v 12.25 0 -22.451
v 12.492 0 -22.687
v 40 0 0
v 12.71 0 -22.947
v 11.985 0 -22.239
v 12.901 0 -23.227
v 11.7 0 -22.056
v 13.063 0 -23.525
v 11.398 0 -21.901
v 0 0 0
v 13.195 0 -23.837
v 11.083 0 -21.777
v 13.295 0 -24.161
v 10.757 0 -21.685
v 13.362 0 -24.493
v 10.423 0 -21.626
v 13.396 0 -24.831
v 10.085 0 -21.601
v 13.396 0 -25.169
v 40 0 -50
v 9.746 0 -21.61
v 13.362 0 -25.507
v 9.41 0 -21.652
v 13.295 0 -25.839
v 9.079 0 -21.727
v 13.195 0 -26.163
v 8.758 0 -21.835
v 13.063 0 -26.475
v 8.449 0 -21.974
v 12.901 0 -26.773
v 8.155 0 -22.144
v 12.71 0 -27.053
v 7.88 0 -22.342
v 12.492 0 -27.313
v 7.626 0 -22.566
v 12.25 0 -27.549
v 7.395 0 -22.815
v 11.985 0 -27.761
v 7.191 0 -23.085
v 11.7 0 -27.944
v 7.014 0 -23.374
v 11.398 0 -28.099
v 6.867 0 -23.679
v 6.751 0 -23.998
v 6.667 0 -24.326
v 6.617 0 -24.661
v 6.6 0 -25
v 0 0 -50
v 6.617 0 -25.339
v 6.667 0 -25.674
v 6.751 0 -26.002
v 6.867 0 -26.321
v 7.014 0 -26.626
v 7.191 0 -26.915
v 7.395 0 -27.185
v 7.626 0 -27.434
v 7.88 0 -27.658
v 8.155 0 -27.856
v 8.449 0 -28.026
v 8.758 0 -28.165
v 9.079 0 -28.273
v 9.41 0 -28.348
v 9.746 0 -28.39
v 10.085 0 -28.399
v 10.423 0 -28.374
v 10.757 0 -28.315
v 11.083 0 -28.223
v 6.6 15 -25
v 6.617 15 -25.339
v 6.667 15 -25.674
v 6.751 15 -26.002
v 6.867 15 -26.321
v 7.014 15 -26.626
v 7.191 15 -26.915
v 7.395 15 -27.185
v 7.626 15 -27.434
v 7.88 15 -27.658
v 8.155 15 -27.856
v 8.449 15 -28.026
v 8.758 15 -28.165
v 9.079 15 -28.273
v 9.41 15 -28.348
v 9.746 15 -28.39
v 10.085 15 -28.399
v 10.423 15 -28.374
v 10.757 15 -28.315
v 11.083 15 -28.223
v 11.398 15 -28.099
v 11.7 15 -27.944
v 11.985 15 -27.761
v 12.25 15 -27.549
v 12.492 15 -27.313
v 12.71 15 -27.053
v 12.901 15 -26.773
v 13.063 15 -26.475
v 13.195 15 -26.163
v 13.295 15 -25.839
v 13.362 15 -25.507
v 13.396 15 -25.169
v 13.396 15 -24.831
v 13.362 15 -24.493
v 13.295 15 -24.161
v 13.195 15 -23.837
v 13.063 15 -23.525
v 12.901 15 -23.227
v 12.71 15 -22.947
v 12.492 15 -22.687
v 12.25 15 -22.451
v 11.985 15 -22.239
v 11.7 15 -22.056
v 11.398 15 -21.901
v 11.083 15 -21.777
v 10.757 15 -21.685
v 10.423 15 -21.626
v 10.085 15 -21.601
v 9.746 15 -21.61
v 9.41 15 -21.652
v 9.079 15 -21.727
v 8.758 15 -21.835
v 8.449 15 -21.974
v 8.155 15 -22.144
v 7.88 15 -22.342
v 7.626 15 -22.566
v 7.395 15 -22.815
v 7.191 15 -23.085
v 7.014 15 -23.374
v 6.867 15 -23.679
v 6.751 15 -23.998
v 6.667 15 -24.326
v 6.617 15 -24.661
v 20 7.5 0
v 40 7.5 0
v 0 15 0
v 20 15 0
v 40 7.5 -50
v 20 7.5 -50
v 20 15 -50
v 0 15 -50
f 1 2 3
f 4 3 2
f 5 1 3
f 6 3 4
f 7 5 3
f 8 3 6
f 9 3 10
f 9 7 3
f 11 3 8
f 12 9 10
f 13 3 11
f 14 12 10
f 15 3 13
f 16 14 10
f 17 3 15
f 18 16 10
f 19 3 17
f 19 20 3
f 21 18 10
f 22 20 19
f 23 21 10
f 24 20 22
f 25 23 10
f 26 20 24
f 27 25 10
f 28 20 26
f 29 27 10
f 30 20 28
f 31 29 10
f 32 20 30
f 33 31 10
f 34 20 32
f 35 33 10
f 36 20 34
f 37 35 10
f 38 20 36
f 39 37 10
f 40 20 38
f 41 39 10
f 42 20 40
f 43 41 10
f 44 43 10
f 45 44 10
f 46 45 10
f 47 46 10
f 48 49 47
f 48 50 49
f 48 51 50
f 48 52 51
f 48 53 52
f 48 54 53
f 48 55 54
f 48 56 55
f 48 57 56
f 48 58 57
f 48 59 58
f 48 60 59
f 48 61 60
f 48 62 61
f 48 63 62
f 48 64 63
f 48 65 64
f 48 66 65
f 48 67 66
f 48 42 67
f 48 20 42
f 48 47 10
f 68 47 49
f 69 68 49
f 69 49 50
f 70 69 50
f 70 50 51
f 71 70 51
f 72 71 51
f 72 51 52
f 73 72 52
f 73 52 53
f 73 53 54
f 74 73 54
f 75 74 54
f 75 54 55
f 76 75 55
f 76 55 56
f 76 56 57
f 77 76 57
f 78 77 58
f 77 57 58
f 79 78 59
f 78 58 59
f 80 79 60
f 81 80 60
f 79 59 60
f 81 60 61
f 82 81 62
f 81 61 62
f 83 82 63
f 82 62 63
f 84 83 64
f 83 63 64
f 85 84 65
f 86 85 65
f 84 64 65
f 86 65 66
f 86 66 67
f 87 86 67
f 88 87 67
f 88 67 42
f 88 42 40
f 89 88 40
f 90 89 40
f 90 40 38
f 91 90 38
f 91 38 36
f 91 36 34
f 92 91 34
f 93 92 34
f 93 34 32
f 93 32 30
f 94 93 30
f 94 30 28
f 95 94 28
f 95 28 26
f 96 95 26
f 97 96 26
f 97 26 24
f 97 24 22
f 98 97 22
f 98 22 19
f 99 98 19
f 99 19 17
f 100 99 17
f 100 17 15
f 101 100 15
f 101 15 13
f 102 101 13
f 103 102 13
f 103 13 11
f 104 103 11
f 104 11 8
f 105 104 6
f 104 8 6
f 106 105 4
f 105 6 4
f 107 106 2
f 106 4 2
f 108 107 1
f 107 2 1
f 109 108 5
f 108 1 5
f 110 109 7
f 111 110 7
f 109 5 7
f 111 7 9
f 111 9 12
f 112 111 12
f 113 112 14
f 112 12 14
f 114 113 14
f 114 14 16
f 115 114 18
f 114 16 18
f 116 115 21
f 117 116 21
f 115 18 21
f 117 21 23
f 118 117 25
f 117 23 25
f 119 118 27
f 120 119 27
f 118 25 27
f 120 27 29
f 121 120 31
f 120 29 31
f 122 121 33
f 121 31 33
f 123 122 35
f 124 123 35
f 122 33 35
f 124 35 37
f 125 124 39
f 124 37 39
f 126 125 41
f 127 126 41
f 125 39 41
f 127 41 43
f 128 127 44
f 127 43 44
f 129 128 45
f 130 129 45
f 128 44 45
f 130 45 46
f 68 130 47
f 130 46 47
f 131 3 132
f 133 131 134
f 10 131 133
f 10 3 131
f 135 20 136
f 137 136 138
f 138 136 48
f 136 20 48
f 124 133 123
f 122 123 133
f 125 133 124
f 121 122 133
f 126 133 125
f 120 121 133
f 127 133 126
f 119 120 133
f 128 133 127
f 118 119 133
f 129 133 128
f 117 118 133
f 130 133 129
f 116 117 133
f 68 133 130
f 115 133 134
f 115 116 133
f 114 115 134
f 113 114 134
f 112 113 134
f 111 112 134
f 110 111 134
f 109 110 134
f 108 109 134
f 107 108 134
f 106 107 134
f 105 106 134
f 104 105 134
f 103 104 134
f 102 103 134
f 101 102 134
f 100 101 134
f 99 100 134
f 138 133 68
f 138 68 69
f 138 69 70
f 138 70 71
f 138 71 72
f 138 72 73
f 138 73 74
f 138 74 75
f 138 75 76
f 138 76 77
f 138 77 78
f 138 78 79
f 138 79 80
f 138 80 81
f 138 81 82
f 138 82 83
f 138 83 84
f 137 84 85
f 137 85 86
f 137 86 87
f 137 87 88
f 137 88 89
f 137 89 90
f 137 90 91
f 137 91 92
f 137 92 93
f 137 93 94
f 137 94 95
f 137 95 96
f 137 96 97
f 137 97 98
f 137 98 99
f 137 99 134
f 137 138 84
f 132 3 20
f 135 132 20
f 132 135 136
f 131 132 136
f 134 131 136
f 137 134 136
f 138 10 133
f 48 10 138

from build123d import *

# Parameters (mm, degrees)
SKETCH1_W              = 20
SKETCH1_H              = 50
BOSS_EXTRUDE1_DEPTH    = 15
SKETCH3_W              = 20
SKETCH3_H              = 50
BOSS_EXTRUDE2_DEPTH    = 7.5
M8X1_25_TAPPED_HOLE1_D = 6.8


with BuildPart() as part:
    # Sketch1 → Boss-Extrude1 (new body)
    with BuildSketch(Plane(origin=(0, 0, 0), x_dir=(1, 0, 0), z_dir=(0, 1, 0))):
        with Locations((10, 25)):
            Rectangle(SKETCH1_W, SKETCH1_H)
    extrude(amount=BOSS_EXTRUDE1_DEPTH)

    # Sketch3 → Boss-Extrude2 (add)
    with BuildSketch(Plane(origin=(0, 0, 0), x_dir=(-1, 0, 0), z_dir=(0, -1, 0))):
        with Locations((-30, 25)):
            Rectangle(SKETCH3_W, SKETCH3_H)
    extrude(amount=-BOSS_EXTRUDE2_DEPTH)

    # M8x1.25 Tapped Hole1 (through all)
    with Locations(Plane(origin=(0, 15, 0), x_dir=(1, 0, 0), z_dir=(0, 1, 0))):
        with Locations((10, 25)):
            Hole(M8X1_25_TAPPED_HOLE1_D / 2)


solid = part.part
